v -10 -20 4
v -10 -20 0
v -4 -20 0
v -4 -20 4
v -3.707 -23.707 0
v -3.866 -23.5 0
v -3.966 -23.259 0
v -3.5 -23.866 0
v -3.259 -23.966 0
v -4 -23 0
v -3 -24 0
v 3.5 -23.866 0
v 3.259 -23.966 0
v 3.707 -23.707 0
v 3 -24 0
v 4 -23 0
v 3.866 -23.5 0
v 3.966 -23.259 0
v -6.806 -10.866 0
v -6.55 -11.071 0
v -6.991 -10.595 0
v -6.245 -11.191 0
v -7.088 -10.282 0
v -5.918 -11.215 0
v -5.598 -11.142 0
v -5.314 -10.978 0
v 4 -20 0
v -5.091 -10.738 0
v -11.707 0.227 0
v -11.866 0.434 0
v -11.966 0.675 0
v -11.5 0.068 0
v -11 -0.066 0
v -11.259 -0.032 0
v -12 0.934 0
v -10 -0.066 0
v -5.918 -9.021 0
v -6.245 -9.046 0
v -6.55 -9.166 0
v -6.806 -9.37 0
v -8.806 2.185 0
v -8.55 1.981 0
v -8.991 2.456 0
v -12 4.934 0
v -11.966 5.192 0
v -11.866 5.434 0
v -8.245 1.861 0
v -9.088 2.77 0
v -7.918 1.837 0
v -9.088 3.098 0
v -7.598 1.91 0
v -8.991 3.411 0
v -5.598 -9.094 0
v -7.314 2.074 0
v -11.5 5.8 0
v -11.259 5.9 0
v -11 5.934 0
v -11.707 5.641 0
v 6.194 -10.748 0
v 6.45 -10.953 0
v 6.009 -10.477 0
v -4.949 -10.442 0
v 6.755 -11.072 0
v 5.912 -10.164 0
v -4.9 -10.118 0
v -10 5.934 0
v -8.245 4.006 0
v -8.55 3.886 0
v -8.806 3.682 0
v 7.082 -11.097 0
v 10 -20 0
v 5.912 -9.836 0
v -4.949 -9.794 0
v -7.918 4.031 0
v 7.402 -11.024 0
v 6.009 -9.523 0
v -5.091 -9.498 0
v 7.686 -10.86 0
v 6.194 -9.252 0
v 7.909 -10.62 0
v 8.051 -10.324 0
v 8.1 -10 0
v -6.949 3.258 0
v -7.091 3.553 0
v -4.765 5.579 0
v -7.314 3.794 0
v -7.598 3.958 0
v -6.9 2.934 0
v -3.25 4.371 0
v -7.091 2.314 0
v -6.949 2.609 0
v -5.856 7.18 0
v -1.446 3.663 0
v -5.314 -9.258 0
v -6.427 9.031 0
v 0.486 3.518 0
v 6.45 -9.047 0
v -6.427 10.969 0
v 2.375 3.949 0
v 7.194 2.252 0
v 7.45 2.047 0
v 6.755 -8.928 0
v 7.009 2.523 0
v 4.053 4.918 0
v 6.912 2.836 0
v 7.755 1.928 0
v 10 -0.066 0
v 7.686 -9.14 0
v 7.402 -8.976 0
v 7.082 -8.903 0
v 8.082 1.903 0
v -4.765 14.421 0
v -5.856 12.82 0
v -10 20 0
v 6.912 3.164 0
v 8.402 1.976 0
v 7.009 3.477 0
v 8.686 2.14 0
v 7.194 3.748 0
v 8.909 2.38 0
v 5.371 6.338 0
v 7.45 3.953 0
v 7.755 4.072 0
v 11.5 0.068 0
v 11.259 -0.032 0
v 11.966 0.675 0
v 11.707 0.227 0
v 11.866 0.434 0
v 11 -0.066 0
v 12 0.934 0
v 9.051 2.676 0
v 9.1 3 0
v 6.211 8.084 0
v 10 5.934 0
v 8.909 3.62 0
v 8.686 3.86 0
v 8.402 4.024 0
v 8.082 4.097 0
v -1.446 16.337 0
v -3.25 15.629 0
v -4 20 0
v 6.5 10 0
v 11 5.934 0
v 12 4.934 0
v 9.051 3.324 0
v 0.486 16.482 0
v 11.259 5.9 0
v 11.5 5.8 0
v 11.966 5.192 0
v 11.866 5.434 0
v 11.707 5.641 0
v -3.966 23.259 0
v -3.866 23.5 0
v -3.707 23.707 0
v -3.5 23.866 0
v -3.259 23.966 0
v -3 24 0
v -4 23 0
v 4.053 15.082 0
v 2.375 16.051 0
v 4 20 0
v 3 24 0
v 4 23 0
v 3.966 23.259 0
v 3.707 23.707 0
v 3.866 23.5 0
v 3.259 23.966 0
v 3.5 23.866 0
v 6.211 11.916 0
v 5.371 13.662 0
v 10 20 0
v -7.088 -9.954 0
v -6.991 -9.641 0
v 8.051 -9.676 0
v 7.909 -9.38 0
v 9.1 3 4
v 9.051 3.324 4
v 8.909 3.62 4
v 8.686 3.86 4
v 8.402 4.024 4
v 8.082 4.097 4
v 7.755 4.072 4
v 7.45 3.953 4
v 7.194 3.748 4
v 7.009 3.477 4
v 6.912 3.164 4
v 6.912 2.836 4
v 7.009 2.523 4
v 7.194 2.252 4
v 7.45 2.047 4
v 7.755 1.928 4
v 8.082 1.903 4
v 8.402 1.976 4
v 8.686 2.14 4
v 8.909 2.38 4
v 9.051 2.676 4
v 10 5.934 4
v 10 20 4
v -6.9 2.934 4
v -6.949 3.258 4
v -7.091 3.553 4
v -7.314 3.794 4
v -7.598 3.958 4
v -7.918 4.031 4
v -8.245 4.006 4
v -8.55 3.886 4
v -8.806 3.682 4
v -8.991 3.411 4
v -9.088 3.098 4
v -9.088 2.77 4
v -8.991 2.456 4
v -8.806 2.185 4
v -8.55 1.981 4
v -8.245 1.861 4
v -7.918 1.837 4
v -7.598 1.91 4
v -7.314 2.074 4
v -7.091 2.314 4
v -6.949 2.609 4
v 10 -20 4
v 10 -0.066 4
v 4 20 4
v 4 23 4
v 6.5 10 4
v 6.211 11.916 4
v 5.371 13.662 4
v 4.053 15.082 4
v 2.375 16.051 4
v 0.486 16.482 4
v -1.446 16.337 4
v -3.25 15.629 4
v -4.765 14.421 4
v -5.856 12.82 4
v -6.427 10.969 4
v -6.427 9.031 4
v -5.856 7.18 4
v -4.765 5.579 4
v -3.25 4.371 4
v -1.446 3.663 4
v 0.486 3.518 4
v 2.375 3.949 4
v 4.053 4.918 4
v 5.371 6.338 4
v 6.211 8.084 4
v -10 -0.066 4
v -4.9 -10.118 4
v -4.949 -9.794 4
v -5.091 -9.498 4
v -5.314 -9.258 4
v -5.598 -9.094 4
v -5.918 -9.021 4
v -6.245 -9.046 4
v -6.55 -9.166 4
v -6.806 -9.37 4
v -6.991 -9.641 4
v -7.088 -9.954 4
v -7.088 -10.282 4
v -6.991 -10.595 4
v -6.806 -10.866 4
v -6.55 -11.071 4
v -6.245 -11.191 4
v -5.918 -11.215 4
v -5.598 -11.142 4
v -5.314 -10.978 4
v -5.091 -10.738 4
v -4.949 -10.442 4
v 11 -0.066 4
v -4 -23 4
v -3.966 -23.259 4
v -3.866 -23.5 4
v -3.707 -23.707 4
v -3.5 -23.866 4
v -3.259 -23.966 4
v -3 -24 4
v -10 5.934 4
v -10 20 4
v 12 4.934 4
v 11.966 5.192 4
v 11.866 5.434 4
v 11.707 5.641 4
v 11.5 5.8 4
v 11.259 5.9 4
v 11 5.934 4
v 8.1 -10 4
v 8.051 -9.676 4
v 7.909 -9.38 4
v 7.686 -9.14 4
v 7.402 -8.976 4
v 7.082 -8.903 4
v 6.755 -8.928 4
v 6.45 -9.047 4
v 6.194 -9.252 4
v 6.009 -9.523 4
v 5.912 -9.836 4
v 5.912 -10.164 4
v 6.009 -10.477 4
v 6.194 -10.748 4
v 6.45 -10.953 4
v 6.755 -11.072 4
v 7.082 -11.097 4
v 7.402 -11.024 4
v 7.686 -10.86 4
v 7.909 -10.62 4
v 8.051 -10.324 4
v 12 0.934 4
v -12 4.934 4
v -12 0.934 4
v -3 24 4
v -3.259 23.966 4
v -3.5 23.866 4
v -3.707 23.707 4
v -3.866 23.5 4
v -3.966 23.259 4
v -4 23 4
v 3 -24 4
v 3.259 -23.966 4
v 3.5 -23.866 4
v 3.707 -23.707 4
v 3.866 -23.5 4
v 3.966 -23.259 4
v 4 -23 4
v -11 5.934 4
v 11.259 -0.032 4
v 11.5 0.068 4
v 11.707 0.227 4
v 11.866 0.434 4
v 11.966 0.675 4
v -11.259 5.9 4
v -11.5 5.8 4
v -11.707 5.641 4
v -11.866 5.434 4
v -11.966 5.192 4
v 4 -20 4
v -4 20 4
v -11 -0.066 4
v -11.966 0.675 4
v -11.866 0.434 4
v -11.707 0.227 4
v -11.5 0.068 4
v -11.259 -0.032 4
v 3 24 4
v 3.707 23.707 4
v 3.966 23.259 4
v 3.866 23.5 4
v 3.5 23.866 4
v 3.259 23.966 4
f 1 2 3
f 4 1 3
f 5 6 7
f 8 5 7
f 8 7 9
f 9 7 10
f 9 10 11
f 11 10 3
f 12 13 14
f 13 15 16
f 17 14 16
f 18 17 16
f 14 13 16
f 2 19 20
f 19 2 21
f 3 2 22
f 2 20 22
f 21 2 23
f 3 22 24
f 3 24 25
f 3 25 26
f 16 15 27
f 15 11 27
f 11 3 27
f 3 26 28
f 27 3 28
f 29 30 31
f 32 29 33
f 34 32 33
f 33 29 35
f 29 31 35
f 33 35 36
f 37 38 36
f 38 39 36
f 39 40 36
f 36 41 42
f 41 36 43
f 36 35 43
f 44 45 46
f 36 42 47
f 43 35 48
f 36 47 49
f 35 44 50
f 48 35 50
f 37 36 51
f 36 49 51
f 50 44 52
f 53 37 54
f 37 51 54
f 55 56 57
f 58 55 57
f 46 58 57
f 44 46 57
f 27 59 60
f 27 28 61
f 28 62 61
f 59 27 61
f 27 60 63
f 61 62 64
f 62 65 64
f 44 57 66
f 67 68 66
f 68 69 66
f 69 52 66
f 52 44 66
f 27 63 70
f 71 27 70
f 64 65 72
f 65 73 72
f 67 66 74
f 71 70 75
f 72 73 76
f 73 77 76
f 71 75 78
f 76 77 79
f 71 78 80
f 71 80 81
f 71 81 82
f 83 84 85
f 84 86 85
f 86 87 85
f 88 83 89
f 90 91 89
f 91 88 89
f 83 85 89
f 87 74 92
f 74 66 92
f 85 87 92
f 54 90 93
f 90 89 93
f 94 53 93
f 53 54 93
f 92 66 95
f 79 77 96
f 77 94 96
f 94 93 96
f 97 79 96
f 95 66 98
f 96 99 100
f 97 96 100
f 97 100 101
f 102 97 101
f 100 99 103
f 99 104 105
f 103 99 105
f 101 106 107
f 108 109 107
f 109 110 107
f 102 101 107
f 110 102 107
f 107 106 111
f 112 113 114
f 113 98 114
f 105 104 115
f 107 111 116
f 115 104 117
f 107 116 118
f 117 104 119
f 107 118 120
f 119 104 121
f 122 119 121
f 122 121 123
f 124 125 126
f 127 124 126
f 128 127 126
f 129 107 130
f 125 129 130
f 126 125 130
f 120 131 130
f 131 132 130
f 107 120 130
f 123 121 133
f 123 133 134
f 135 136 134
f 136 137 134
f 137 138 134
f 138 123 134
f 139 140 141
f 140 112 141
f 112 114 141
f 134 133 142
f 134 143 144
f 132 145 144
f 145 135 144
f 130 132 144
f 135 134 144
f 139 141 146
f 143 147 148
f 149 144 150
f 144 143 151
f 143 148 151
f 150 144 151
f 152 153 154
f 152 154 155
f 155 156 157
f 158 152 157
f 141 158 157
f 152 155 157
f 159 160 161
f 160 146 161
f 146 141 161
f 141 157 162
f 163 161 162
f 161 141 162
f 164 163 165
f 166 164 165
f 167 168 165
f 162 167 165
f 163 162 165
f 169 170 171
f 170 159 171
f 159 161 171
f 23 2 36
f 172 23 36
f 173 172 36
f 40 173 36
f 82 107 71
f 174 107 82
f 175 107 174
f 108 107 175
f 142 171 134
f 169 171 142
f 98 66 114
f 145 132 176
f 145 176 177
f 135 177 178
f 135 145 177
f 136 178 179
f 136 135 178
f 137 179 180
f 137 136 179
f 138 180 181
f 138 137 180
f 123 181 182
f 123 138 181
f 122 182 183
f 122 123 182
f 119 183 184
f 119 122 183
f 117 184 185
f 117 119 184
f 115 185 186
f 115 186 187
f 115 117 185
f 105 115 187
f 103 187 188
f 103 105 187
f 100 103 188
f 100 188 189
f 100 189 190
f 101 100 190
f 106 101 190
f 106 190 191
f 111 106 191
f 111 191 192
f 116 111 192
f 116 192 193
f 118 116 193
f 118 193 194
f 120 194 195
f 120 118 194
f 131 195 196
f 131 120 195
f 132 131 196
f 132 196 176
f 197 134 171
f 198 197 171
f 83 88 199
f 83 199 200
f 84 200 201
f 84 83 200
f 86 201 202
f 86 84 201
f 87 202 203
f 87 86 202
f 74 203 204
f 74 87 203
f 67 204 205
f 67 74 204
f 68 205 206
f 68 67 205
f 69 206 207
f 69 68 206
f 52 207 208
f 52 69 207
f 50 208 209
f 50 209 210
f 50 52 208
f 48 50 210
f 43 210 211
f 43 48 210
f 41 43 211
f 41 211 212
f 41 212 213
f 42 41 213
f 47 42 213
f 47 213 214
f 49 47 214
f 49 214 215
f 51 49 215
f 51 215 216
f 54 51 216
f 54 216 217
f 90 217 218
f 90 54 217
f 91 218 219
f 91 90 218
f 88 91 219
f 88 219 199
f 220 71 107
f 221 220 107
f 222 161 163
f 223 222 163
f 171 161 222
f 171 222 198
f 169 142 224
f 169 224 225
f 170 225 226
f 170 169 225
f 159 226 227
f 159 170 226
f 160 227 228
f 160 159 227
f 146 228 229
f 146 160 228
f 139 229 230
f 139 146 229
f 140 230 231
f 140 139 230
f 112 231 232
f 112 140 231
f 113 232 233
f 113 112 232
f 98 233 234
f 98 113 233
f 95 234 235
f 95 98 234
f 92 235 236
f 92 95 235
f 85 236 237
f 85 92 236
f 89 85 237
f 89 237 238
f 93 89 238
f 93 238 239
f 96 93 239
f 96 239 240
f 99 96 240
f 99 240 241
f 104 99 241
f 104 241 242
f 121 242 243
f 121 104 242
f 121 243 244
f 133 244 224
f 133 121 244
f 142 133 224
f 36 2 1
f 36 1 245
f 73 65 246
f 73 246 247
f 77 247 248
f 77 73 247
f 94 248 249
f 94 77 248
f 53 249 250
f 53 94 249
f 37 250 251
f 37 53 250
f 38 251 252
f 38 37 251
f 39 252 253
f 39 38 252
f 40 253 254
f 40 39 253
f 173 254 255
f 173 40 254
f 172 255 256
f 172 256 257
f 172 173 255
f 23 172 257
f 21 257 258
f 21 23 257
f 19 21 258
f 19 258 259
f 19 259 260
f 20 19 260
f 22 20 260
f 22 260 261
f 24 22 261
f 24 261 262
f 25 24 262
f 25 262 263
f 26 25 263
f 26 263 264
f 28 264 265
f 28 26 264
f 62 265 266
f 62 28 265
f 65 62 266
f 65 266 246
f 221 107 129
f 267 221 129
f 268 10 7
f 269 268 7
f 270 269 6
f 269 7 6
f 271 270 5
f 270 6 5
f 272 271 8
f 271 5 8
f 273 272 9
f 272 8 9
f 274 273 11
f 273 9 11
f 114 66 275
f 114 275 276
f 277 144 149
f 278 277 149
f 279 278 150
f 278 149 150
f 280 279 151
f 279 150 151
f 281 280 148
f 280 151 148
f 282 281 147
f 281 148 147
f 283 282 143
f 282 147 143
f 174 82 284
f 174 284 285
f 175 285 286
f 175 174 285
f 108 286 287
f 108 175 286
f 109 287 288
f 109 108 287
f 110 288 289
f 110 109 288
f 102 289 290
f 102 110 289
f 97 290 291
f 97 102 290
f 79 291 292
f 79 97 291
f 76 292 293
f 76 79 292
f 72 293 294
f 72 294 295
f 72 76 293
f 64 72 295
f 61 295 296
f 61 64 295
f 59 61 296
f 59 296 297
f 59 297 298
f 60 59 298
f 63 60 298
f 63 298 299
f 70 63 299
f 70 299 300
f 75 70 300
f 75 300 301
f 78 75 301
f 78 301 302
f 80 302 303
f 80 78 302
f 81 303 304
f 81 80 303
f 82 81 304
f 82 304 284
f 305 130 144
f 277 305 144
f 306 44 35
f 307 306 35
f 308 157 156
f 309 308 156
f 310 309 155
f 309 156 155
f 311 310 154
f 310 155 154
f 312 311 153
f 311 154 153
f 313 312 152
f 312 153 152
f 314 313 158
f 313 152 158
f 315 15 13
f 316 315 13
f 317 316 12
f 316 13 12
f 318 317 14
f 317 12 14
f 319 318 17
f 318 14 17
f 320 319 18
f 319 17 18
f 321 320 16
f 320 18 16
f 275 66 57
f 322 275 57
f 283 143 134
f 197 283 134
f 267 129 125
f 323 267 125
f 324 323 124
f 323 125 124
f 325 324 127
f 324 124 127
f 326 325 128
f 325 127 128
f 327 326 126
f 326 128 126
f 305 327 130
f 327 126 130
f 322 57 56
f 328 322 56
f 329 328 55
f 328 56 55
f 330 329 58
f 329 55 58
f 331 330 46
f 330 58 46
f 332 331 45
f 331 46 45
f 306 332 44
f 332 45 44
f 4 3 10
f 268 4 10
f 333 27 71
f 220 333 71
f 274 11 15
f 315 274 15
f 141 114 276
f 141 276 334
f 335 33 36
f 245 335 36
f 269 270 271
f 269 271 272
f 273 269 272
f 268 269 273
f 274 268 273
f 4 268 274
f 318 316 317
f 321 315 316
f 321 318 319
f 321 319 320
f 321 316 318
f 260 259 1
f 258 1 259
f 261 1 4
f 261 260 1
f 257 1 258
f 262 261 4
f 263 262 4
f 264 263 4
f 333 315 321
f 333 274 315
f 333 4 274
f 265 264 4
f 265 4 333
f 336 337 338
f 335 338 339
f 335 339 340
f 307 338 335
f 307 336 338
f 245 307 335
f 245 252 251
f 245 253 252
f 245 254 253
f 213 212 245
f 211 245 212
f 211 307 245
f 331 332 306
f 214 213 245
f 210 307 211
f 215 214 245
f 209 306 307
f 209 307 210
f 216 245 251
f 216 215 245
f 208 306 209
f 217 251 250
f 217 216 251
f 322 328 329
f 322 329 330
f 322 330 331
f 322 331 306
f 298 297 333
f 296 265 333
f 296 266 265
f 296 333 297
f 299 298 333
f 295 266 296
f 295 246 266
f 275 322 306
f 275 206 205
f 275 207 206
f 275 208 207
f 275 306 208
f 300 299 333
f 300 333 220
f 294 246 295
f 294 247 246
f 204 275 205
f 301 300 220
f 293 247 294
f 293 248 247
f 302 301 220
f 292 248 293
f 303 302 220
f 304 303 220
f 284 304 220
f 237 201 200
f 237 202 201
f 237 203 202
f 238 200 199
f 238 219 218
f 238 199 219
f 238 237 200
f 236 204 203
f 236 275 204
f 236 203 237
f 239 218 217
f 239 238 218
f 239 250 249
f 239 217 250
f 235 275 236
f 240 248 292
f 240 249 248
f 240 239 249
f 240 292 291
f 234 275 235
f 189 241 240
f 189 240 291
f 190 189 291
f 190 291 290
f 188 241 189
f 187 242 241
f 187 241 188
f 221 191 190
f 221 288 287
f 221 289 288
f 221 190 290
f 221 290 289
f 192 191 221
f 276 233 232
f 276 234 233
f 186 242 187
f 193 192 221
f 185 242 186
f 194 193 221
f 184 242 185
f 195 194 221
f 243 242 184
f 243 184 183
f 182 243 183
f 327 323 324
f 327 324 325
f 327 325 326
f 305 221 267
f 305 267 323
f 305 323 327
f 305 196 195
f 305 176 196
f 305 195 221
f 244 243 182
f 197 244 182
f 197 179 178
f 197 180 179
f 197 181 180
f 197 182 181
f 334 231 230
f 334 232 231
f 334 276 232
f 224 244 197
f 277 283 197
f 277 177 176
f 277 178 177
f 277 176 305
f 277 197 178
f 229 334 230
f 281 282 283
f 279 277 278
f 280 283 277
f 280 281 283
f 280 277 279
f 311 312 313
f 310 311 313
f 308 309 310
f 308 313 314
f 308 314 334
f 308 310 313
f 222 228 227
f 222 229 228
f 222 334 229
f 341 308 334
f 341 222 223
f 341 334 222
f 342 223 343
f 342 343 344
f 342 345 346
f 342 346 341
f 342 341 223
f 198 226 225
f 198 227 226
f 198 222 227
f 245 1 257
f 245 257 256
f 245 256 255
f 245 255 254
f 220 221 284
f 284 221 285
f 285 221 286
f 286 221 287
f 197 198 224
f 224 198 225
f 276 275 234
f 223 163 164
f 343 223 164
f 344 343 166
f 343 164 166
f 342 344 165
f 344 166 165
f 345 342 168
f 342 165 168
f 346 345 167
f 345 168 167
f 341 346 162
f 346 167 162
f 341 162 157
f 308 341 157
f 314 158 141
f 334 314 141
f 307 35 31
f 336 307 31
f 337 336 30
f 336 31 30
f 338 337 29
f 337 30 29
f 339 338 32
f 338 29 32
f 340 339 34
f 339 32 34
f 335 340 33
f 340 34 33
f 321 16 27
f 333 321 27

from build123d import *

# Parameters (mm, degrees)
SKETCH1_W           = 20
SKETCH1_H           = 40
SKETCH1_R           = 1.1
SKETCH1_R_2         = 6.5
BOSS_EXTRUDE2_DEPTH = 4


with BuildPart() as part:
    # Sketch1 → Boss-Extrude2 (new body)
    with BuildSketch(Plane.XY):
        Rectangle(SKETCH1_W, SKETCH1_H)
        with Locations((7, -10)):
            Circle(SKETCH1_R, mode=Mode.SUBTRACT)
        with Locations((-6, -10.118141531)):
            Circle(SKETCH1_R, mode=Mode.SUBTRACT)
        with Locations((-8, 2.93366218)):
            Circle(SKETCH1_R, mode=Mode.SUBTRACT)
        with Locations((8, 3)):
            Circle(SKETCH1_R, mode=Mode.SUBTRACT)
        with Locations((0, 10)):
            Circle(SKETCH1_R_2, mode=Mode.SUBTRACT)
        with BuildLine():
            Line((-4, 23), (-4, 20))
            Line((-4, 20), (4, 20))
            Line((4, 20), (4, 23))
            ThreePointArc((4, 23), (3.707106781, 23.707106781), (3, 24))
            Line((3, 24), (-3, 24))
            ThreePointArc((-3, 24), (-3.707106781, 23.707106781), (-4, 23))
        make_face()
        with BuildLine():
            Line((11, 5.93366218), (10, 5.93366218))
            Line((10, 5.93366218), (10, -0.06633782))
            Line((10, -0.06633782), (11, -0.06633782))
            ThreePointArc((11, -0.06633782), (11.707106781, 0.226555399), (12, 0.93366218))
            Line((12, 0.93366218), (12, 4.93366218))
            ThreePointArc((12, 4.93366218), (11.707106781, 5.640768961), (11, 5.93366218))
        make_face()
        with BuildLine():
            Line((4, -20), (-4, -20))
            Line((-4, -20), (-4, -23))
            ThreePointArc((-4, -23), (-3.707106781, -23.707106781), (-3, -24))
            Line((-3, -24), (3, -24))
            ThreePointArc((3, -24), (3.707106781, -23.707106781), (4, -23))
            Line((4, -23), (4, -20))
        make_face()
        with BuildLine():
            Line((-10, -0.06633782), (-10, 5.93366218))
            Line((-10, 5.93366218), (-11, 5.93366218))
            ThreePointArc((-11, 5.93366218), (-11.707106781, 5.640768961), (-12, 4.93366218))
            Line((-12, 4.93366218), (-12, 0.93366218))
            ThreePointArc((-12, 0.93366218), (-11.707106781, 0.226555399), (-11, -0.06633782))
            Line((-11, -0.06633782), (-10, -0.06633782))
        make_face()
    extrude(amount=BOSS_EXTRUDE2_DEPTH)


solid = part.part
